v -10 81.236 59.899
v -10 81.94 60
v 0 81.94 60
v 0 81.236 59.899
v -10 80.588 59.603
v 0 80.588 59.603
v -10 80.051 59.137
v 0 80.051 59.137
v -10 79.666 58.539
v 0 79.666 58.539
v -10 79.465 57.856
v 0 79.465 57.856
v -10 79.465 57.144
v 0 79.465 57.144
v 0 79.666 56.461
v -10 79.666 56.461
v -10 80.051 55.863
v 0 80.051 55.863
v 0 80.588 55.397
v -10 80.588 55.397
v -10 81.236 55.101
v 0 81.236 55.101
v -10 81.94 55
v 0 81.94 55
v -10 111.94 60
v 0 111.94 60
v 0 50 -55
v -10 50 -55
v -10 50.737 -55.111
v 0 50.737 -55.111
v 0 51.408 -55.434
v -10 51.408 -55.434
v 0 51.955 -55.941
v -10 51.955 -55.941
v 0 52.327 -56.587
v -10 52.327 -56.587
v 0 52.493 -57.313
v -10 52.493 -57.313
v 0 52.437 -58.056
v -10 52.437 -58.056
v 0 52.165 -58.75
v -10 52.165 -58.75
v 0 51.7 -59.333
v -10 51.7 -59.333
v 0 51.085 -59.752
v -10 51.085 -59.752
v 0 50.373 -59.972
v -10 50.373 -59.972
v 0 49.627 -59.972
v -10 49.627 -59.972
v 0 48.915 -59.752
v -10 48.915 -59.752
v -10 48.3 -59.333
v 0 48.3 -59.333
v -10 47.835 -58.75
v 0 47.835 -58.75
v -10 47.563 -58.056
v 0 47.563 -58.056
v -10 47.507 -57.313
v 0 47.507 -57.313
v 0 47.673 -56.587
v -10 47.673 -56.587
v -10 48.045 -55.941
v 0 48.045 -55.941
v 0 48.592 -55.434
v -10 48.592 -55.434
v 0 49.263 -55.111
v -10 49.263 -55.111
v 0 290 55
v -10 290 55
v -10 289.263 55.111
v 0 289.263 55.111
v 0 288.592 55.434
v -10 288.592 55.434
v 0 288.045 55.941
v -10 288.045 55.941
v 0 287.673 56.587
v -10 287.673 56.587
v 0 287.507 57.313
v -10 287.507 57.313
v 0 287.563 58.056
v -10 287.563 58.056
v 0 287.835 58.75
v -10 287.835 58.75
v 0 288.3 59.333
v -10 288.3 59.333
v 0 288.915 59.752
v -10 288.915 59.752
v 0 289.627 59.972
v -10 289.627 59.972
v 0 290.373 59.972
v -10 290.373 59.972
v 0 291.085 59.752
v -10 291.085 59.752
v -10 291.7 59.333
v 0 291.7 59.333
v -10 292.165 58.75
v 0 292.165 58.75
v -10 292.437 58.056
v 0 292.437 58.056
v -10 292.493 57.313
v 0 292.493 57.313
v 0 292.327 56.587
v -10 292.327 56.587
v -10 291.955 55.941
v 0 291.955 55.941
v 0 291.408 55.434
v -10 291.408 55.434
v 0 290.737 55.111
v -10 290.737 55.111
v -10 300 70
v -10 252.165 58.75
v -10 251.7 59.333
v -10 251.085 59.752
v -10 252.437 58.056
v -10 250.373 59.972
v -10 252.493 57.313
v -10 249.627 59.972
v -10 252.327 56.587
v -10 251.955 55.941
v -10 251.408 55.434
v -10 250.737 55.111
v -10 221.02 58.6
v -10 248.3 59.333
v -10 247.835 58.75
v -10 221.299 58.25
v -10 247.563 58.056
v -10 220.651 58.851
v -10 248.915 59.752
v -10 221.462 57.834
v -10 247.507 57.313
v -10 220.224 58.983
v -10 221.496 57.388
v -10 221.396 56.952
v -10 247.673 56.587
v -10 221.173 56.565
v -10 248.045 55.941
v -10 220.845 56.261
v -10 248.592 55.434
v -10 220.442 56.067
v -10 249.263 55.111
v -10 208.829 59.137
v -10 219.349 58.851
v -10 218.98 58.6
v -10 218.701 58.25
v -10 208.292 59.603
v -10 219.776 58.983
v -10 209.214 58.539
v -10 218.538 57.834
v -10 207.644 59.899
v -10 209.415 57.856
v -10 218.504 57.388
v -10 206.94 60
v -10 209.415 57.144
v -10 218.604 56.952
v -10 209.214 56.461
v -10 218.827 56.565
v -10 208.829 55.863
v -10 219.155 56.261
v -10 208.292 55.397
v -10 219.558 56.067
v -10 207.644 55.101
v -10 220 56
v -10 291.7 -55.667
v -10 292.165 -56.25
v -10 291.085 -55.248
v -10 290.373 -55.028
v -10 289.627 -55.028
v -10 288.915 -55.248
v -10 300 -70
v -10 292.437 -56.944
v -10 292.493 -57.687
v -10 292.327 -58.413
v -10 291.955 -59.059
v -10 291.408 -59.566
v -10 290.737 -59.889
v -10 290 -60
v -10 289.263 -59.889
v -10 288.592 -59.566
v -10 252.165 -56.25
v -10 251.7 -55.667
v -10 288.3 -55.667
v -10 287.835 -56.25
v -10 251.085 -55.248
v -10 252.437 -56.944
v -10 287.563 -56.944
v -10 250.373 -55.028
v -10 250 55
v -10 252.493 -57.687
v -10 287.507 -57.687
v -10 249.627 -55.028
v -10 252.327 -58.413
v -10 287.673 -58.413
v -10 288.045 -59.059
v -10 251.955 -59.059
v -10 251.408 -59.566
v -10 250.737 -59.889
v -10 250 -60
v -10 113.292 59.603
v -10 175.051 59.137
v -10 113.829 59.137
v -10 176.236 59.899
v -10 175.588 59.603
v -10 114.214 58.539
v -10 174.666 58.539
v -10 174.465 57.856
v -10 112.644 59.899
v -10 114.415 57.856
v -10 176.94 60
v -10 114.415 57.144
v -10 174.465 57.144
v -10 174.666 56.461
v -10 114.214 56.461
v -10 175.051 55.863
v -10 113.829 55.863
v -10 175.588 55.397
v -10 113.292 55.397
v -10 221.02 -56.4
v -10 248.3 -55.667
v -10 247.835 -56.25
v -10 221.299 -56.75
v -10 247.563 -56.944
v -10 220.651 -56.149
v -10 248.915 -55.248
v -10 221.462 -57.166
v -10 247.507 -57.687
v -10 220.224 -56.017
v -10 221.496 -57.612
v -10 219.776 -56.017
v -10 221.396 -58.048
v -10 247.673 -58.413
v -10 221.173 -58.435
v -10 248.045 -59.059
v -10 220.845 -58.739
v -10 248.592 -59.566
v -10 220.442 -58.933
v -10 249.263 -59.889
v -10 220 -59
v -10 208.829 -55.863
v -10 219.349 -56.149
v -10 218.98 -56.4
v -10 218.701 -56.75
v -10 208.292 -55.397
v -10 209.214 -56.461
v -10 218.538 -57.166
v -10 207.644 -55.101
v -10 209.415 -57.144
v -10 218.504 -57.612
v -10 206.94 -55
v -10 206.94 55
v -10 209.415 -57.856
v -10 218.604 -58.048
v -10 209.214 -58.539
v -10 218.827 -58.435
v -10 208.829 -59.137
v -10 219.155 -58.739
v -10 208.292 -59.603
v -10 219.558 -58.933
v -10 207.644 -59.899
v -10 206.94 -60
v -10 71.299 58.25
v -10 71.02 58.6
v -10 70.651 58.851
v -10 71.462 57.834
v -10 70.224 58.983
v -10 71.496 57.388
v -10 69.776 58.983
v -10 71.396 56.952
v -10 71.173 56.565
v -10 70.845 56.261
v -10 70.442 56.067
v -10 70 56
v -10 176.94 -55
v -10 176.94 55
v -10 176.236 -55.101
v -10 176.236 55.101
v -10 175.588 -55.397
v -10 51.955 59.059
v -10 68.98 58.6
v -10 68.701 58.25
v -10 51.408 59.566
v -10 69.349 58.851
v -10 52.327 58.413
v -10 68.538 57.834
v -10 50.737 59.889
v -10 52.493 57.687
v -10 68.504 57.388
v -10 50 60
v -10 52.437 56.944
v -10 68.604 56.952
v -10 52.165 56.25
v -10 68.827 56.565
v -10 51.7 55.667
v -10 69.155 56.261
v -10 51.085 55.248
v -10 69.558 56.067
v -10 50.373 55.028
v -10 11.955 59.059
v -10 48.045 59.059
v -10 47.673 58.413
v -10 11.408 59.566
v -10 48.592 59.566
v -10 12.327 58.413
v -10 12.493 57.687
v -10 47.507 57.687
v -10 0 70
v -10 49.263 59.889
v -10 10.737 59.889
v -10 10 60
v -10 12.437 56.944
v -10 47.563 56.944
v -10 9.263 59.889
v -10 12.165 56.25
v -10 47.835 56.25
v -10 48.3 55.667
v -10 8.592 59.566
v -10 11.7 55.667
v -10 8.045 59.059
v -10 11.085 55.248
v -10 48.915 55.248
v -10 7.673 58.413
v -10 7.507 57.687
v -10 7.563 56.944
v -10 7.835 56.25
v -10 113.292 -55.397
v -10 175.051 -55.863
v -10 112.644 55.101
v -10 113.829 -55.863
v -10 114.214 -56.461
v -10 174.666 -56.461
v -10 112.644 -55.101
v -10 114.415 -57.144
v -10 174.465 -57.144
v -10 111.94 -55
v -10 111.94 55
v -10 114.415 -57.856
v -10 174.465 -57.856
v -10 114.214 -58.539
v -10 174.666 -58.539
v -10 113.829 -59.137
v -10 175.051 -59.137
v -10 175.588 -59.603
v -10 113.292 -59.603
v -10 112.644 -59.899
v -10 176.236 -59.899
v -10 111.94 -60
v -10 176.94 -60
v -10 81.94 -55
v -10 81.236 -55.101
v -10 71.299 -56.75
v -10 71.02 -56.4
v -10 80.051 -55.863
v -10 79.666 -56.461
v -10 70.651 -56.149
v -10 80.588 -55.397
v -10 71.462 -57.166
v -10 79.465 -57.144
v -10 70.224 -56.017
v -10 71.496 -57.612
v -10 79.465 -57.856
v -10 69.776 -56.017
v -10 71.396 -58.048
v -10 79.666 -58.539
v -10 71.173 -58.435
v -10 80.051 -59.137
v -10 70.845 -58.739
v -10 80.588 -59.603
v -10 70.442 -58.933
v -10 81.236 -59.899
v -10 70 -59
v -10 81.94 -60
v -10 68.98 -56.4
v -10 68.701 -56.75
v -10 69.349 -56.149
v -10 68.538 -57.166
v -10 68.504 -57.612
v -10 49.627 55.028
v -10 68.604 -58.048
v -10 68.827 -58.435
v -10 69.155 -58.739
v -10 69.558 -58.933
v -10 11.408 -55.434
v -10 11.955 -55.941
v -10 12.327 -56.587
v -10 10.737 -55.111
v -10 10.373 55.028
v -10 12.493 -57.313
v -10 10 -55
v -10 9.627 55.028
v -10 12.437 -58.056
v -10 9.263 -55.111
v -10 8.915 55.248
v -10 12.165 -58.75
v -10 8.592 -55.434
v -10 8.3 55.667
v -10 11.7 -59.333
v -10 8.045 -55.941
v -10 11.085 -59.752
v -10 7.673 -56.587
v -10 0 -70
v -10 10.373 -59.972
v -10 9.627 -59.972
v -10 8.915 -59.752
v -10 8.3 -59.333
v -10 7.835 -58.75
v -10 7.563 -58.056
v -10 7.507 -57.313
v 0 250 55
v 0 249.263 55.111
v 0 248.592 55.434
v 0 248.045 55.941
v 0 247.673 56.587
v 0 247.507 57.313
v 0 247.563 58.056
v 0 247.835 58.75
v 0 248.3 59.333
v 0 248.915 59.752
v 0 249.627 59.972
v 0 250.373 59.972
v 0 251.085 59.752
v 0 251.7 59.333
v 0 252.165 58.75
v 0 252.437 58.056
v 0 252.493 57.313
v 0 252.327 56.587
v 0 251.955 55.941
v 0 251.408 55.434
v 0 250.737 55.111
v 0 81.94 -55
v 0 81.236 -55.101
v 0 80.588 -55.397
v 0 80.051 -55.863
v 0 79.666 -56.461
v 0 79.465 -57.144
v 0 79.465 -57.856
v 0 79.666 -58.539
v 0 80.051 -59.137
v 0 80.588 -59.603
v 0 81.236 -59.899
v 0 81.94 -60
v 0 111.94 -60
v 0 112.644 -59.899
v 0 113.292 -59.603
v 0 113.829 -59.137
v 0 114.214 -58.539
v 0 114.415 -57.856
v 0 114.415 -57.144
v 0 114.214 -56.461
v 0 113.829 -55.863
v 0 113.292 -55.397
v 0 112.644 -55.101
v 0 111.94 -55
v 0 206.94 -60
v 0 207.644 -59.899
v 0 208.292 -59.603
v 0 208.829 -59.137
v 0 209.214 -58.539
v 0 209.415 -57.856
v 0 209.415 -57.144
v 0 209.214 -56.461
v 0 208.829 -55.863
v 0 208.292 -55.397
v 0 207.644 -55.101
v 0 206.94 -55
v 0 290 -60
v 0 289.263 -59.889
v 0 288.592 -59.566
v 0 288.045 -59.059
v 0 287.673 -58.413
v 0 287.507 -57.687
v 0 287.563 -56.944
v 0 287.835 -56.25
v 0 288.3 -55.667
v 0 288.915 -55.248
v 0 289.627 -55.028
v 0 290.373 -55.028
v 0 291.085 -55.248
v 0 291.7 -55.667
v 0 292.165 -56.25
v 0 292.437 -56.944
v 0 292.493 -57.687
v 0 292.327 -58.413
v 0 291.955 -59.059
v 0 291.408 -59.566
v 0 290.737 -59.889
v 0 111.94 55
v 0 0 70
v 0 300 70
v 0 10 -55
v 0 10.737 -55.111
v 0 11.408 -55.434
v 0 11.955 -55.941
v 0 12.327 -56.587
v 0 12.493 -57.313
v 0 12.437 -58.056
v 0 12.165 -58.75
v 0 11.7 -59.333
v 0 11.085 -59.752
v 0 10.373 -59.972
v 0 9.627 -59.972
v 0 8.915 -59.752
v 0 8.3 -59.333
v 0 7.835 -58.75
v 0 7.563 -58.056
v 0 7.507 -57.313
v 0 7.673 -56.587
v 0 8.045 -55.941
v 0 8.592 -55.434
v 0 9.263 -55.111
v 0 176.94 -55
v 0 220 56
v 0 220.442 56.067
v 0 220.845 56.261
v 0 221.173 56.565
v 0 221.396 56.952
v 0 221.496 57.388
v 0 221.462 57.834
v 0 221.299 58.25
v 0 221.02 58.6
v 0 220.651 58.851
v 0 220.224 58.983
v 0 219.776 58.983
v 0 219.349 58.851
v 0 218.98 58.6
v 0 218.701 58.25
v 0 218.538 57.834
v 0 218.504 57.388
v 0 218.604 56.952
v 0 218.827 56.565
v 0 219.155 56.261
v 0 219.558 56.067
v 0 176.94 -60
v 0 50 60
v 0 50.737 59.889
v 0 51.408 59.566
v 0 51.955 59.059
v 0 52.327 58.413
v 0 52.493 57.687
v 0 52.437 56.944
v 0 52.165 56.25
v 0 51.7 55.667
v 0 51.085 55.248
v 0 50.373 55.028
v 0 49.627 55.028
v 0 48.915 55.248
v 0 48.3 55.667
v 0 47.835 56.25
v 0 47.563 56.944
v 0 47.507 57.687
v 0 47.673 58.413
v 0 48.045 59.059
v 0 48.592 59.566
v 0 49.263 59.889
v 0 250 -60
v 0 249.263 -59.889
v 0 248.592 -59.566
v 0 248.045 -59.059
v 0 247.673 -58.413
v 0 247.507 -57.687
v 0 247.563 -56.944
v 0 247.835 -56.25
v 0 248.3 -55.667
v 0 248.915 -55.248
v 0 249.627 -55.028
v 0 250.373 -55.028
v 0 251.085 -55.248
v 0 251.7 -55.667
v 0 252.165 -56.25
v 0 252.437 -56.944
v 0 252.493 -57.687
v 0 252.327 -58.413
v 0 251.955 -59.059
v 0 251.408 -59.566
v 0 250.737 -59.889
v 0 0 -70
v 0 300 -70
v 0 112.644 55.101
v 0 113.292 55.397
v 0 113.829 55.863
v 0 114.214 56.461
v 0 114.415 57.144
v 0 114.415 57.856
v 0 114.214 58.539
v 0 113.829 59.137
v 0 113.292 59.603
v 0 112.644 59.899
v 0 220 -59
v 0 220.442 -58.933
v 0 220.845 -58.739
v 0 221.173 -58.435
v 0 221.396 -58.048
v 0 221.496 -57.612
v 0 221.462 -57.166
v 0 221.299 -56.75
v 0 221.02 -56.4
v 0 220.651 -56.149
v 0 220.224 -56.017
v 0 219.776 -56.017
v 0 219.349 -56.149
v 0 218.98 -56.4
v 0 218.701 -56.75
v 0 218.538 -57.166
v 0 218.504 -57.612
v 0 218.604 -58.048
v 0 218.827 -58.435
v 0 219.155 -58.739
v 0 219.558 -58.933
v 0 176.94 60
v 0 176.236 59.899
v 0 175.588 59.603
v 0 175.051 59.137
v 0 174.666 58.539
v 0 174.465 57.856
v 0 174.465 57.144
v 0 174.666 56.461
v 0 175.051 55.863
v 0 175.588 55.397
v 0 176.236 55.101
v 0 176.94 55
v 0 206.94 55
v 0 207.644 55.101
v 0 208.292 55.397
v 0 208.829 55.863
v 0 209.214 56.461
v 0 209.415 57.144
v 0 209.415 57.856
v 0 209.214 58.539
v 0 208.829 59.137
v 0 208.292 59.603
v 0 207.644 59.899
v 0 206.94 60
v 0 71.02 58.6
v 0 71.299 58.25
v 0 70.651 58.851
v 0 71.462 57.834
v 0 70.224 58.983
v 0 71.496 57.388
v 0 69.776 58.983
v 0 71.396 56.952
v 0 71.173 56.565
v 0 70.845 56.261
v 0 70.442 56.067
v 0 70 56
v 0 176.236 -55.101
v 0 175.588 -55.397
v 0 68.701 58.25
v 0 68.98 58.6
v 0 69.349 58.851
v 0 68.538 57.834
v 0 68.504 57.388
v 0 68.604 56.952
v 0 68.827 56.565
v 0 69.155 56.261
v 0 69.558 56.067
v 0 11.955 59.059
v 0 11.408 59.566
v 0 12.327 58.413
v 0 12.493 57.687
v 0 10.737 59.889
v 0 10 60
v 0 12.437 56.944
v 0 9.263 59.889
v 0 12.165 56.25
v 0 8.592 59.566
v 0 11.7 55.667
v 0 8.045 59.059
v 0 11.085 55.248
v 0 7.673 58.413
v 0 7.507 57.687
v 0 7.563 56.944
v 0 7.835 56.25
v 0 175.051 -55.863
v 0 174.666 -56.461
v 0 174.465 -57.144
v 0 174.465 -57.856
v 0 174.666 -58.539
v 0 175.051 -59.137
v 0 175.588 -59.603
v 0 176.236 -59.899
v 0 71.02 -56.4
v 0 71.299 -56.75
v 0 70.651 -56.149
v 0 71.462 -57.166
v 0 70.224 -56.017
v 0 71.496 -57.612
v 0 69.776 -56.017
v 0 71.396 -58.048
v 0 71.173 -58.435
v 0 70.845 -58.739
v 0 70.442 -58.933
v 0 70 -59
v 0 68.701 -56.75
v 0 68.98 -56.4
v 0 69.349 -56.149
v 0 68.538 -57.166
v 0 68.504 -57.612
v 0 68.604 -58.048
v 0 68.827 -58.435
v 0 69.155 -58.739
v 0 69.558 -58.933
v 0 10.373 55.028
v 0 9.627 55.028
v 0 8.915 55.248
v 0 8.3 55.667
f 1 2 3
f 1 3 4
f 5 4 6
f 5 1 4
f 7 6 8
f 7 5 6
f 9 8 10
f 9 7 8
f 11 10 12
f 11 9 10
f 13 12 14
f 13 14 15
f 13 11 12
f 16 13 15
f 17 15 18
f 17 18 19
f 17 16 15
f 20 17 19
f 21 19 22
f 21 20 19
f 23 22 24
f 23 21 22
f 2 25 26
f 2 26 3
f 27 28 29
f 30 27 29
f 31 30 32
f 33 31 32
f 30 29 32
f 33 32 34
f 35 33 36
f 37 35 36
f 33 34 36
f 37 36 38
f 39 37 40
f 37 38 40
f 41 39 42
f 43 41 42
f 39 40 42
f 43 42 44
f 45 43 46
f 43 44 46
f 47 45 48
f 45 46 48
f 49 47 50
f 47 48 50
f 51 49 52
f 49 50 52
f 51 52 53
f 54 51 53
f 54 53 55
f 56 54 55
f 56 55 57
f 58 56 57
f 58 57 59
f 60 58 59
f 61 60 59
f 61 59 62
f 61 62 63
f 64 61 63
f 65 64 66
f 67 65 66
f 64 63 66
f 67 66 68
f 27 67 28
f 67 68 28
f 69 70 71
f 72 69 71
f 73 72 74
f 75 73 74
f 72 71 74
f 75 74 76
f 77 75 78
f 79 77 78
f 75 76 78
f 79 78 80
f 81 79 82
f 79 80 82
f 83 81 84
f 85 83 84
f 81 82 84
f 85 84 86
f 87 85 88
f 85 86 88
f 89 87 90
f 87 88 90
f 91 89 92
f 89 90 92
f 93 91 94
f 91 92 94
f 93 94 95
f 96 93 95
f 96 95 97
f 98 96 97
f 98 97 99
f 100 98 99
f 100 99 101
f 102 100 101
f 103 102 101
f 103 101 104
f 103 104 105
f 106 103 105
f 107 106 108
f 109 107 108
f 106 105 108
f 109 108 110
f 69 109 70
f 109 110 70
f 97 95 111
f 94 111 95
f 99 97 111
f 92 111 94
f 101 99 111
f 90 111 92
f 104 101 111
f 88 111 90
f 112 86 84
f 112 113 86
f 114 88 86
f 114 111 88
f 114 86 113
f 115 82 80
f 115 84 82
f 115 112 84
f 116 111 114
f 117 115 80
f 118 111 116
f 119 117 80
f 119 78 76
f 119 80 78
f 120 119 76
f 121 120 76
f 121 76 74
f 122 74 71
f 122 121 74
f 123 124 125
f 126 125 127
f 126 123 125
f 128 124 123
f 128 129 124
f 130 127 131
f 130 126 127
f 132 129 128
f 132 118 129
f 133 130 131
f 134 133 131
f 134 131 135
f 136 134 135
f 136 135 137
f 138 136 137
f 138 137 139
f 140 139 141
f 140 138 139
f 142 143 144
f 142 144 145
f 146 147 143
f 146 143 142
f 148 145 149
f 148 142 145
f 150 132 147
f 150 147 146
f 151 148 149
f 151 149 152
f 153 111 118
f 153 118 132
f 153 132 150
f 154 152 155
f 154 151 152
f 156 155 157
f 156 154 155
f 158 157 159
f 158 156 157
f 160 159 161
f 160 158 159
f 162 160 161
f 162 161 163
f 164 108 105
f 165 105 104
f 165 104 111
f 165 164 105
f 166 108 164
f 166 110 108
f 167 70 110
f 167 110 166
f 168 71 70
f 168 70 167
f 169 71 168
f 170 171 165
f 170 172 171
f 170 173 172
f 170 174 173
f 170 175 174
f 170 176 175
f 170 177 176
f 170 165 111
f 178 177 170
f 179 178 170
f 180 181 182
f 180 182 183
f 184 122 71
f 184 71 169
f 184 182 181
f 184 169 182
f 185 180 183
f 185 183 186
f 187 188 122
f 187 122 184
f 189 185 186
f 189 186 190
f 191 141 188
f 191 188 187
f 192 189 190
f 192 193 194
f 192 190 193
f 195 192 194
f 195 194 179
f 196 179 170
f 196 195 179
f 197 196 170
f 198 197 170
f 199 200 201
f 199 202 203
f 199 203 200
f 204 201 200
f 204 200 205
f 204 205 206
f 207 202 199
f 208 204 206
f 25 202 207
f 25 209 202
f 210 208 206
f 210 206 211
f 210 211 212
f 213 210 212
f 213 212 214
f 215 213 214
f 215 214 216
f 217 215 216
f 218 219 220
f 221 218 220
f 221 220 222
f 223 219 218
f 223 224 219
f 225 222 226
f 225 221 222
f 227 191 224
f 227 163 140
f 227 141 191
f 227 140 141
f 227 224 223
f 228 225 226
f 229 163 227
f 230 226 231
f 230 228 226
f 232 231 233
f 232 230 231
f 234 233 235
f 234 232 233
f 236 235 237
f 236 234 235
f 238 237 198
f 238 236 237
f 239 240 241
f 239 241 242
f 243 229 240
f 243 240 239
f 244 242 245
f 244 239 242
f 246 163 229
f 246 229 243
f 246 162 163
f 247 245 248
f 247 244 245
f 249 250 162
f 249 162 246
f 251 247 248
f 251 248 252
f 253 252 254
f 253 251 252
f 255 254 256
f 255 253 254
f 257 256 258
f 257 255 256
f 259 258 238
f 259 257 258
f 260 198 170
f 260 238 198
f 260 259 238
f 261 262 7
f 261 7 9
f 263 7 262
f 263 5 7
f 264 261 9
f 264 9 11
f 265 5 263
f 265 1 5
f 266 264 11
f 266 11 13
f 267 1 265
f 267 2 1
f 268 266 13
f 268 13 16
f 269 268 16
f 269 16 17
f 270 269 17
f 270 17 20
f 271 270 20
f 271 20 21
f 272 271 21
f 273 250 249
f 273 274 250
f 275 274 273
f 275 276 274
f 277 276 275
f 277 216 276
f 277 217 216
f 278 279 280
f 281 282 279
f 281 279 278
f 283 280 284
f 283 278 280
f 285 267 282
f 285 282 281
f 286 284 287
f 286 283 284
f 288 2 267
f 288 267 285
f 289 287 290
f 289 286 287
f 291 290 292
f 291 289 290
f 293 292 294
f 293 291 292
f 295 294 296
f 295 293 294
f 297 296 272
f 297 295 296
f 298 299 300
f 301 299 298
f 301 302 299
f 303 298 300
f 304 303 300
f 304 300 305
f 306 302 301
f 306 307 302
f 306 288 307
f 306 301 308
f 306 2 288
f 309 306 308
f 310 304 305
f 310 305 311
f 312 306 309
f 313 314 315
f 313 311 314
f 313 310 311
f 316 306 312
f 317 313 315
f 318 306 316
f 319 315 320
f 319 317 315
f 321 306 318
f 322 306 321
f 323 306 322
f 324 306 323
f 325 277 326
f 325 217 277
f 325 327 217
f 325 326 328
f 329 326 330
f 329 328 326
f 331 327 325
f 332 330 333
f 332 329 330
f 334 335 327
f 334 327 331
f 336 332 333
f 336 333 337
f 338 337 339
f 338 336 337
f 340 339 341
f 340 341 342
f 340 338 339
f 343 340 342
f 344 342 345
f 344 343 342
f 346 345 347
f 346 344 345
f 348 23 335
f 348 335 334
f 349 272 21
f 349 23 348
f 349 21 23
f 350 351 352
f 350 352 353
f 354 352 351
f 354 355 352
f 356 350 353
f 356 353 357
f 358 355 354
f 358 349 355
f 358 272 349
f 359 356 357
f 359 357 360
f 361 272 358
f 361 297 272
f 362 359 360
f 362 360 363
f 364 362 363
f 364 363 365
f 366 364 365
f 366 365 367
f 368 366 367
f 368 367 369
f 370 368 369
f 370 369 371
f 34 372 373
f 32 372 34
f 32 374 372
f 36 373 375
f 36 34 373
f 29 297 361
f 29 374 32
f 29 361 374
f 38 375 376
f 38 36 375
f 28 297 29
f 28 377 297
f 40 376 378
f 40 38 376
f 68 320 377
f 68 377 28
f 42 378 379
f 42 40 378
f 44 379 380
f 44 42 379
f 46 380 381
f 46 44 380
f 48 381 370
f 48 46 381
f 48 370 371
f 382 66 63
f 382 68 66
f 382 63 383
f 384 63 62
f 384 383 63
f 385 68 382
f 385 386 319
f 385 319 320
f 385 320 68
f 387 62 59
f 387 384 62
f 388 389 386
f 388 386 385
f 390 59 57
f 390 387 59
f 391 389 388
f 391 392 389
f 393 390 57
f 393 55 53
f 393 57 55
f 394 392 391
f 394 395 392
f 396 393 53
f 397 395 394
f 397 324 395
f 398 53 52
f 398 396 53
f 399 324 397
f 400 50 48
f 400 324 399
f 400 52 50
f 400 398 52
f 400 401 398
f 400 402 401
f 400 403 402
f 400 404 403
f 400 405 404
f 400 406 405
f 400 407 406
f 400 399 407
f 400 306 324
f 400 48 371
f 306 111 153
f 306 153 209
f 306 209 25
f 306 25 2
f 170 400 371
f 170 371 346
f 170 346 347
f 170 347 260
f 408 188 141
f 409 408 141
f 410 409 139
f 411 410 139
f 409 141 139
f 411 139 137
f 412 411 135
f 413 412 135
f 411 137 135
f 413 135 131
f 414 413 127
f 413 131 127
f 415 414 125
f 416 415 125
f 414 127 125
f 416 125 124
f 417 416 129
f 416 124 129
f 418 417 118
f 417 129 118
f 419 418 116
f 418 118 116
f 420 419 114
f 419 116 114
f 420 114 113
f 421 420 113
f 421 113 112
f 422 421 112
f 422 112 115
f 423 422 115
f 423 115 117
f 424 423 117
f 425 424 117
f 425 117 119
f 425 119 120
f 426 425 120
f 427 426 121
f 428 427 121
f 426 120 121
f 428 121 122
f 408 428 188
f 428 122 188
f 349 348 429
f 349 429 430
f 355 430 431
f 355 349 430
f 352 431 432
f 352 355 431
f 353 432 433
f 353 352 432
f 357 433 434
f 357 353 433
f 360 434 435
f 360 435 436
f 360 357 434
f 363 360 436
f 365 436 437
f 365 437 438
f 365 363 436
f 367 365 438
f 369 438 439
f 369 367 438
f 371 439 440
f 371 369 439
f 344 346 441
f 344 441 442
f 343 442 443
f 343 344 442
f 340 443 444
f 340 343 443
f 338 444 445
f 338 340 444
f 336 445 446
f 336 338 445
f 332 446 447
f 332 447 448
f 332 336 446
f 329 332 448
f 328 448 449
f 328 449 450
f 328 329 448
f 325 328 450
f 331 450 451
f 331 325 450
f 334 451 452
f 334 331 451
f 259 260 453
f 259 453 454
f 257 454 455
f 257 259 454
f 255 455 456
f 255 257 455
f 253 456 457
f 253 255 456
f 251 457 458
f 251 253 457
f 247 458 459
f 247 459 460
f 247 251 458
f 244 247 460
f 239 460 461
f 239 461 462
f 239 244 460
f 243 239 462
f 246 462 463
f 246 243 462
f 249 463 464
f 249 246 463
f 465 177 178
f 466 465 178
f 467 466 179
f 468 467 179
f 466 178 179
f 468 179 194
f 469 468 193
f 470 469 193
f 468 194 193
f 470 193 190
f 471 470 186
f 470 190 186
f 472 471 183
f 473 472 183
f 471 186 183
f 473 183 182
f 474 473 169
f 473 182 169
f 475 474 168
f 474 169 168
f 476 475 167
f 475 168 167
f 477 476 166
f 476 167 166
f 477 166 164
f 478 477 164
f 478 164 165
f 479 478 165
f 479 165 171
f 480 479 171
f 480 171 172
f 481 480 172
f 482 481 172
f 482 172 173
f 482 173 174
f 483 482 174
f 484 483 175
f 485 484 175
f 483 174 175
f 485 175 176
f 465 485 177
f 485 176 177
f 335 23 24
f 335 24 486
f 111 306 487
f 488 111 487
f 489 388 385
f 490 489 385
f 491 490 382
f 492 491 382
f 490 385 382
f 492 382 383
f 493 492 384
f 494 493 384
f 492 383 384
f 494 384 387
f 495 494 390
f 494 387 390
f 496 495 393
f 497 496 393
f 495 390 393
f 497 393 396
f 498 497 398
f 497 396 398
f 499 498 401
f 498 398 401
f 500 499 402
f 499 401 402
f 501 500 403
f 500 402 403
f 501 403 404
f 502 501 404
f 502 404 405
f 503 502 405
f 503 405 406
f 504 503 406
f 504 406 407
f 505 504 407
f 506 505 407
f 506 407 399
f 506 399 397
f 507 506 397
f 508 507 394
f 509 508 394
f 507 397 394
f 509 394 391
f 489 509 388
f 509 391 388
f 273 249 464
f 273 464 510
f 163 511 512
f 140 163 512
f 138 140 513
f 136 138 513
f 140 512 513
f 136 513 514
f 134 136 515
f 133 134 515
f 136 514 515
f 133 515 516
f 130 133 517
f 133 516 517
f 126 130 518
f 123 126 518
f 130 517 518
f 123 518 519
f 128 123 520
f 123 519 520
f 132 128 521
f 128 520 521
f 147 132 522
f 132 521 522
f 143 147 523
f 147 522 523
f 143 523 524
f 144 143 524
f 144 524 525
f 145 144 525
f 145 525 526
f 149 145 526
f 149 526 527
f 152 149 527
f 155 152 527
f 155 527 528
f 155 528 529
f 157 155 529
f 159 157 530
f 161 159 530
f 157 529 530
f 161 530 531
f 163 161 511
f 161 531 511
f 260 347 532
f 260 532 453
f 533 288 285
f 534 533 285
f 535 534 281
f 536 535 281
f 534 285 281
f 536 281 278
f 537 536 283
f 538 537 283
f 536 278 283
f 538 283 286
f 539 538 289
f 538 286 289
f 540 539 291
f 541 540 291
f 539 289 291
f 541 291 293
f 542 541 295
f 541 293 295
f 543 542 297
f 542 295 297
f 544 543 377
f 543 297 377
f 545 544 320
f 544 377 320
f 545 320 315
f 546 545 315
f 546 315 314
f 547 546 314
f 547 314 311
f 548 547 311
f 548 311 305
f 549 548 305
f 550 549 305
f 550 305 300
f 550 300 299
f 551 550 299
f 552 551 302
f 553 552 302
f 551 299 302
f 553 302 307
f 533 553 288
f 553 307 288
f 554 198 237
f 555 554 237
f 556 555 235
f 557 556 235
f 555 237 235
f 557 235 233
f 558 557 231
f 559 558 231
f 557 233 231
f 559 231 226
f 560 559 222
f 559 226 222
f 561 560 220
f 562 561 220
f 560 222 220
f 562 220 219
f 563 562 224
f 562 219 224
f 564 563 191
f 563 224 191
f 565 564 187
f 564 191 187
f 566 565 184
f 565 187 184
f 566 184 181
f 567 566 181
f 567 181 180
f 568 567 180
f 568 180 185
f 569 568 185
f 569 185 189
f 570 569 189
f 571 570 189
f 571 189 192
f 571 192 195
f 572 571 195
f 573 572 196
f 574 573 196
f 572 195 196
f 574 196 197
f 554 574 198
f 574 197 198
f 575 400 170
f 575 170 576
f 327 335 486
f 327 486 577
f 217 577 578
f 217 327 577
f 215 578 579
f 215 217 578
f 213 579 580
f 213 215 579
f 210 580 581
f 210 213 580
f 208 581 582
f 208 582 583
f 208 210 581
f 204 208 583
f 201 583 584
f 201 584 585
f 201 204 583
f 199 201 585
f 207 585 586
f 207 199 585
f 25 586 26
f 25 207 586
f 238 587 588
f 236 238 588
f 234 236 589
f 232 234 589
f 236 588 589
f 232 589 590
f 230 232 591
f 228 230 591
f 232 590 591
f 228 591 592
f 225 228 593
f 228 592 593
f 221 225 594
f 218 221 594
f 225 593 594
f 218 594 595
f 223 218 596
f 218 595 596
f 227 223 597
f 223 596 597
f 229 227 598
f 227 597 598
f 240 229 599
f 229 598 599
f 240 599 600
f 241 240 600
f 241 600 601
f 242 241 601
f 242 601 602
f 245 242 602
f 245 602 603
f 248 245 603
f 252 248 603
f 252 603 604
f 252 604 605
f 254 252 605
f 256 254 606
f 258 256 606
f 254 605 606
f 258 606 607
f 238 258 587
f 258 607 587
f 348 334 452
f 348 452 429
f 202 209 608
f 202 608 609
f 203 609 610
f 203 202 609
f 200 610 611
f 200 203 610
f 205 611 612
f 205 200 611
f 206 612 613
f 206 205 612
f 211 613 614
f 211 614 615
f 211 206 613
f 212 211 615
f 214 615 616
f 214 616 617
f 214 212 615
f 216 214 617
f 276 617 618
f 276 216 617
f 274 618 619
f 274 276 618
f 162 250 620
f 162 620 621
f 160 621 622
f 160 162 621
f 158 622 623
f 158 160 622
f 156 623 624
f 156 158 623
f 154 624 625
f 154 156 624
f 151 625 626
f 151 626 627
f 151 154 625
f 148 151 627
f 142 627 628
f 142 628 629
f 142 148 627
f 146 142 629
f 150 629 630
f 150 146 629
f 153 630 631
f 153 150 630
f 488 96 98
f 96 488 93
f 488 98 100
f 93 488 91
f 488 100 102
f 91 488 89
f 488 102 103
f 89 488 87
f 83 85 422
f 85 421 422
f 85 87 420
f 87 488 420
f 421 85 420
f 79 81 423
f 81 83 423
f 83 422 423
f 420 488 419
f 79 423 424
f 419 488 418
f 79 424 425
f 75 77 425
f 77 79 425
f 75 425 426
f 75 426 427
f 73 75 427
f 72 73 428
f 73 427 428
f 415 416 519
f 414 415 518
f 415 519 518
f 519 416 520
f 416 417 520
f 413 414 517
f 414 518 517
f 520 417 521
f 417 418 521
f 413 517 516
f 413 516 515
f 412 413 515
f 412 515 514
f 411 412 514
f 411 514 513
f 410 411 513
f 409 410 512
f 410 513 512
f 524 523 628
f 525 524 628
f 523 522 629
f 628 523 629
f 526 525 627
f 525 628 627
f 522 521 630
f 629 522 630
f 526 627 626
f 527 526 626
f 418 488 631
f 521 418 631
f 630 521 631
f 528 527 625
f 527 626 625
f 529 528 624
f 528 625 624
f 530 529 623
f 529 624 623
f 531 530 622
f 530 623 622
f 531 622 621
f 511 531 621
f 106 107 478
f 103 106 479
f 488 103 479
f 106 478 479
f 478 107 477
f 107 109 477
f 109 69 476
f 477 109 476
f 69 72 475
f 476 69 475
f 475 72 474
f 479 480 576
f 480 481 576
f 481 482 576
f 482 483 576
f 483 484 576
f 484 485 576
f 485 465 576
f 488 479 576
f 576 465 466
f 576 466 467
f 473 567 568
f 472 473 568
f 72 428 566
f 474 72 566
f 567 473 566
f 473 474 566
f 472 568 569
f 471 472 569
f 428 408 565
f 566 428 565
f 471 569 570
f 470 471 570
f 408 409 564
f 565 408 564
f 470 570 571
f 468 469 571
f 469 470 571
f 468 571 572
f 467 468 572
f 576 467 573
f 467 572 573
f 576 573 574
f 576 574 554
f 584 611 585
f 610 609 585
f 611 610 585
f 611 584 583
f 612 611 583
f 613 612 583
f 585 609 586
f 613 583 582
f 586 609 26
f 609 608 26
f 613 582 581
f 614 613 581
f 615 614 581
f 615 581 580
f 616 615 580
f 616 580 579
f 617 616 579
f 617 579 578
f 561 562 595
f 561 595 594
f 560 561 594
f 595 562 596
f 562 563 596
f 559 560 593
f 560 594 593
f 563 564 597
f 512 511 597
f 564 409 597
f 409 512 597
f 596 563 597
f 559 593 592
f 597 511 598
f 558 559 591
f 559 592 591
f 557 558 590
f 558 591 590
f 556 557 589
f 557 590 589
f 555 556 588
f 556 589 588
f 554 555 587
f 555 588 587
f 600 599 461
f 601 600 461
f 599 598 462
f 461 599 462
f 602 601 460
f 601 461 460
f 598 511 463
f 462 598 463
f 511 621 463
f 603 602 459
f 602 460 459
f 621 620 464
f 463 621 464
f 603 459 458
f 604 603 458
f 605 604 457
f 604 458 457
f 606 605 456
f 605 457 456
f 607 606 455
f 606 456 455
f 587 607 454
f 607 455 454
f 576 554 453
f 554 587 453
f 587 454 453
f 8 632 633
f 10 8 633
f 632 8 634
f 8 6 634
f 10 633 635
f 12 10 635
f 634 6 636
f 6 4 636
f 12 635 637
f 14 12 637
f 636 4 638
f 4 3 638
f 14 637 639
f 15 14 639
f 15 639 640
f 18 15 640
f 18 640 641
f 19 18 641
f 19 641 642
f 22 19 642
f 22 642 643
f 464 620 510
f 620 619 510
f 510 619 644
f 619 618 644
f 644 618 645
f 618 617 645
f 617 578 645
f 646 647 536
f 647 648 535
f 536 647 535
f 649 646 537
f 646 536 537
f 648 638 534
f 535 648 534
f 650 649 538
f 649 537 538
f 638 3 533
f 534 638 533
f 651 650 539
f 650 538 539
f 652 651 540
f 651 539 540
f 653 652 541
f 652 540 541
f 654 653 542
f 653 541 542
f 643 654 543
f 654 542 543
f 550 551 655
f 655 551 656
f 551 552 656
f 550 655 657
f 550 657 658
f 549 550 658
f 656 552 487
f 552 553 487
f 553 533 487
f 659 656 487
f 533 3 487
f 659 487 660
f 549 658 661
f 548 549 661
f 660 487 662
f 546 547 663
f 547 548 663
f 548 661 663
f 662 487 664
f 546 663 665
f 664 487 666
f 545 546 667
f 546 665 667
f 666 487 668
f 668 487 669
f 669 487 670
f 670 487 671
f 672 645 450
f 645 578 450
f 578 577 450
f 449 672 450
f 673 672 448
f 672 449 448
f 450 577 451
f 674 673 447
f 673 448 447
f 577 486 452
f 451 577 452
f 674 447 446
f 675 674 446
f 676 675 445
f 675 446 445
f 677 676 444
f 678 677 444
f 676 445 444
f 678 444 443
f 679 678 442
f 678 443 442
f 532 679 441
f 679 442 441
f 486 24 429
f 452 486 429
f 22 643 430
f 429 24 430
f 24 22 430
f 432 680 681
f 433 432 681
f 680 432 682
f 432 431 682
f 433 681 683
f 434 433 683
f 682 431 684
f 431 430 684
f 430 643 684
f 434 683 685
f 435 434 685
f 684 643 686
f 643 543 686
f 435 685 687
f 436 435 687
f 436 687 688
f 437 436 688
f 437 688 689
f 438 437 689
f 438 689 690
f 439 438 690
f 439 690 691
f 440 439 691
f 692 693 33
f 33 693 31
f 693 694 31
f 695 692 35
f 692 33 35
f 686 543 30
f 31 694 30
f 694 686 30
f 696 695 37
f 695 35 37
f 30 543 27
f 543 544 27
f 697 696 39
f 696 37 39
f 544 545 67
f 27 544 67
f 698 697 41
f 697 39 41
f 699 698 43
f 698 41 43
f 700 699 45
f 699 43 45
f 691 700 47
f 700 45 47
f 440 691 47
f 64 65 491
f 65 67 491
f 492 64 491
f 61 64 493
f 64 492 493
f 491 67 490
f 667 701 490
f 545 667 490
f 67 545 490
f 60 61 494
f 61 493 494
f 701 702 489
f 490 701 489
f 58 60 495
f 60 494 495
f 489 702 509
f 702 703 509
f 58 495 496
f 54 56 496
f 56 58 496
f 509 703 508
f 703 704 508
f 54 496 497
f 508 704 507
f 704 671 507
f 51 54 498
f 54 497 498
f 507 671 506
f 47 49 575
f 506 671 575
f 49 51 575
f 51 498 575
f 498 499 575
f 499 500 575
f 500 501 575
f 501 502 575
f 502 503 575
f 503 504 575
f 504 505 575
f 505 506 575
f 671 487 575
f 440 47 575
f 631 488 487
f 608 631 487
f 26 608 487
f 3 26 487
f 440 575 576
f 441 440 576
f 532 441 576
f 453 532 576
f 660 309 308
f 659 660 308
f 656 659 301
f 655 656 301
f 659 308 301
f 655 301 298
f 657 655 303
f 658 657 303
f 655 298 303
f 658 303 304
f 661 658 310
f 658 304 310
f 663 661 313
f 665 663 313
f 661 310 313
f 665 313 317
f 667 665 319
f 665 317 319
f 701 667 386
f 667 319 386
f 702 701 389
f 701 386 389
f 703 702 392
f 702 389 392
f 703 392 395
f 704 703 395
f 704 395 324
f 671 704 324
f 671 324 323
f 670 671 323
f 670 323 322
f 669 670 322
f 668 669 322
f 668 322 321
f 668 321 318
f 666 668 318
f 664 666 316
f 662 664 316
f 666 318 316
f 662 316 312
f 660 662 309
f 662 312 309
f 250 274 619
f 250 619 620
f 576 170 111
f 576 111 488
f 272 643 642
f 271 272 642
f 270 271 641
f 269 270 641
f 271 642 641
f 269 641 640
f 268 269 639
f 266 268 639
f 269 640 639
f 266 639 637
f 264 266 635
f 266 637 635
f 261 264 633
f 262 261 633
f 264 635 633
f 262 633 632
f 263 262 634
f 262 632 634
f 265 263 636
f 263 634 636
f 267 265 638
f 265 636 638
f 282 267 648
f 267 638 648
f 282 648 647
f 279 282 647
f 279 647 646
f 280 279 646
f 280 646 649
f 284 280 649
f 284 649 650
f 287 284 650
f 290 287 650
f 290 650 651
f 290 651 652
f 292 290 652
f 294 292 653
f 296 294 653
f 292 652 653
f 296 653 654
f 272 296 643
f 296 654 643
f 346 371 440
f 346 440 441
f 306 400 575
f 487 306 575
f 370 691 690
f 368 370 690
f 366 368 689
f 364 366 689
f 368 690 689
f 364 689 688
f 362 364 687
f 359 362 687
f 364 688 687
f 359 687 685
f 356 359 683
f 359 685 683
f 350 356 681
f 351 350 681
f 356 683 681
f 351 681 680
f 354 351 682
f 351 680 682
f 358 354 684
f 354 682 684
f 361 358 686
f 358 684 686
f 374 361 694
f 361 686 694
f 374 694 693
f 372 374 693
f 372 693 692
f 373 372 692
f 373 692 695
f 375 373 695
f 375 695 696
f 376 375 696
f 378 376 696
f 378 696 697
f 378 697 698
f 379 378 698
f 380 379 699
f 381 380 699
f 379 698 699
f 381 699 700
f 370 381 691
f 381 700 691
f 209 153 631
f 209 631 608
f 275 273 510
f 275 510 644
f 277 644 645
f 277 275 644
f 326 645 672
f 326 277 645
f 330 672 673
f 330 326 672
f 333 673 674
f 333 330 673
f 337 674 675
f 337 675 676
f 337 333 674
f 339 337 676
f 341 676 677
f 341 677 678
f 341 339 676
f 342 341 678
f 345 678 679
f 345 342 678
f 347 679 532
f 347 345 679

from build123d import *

# Parameters (mm, degrees)
BASE_FLANGE1_OUTLINE_W = 10
BASE_FLANGE1_OUTLINE_H = 140
BASE_FLANGE1_DEPTH     = 300
SKETCH6_R              = 2.5
CUT_EXTRUDE1_DEPTH     = 10
SKETCH11_R             = 1.5
CUT_EXTRUDE2_DEPTH     = 10
CUT_EXTRUDE3_DEPTH     = 10


# Read off the part's stored shape, not the designer's step: Base-Flange1
with BuildPart() as part:
    # Base-Flange1 outline → Base-Flange1 (new body)
    with BuildSketch(Plane(origin=(0, 0, 0), x_dir=(1, 0, 0), z_dir=(0, 1, 0))):
        with Locations((-5, 0)):
            Rectangle(BASE_FLANGE1_OUTLINE_W, BASE_FLANGE1_OUTLINE_H)
    extrude(amount=BASE_FLANGE1_DEPTH)

    # Sketch6 → Cut-Extrude1 (cut)
    with BuildSketch(Plane.ZY.offset(10)):
        with Locations((57.5, 10)):
            Circle(SKETCH6_R)
        with Locations((-57.5, 10)):
            Circle(SKETCH6_R)
        with Locations((-57.5, 50)):
            Circle(SKETCH6_R)
        with Locations((57.5, 50)):
            Circle(SKETCH6_R)
        with Locations(Location((57.5, 250, 0), (0, 0, 180))):
            Circle(SKETCH6_R)
        with Locations(Location((-57.5, 250, 0), (0, 0, 180))):
            Circle(SKETCH6_R)
        with Locations(Location((-57.5, 290, 0), (0, 0, 180))):
            Circle(SKETCH6_R)
        with Locations(Location((57.5, 290, 0), (0, 0, 180))):
            Circle(SKETCH6_R)
    extrude(amount=-CUT_EXTRUDE1_DEPTH, mode=Mode.SUBTRACT)

    # Sketch11 → Cut-Extrude2 (cut)
    with BuildSketch(Plane(origin=(0, 0, 0), x_dir=(0, 0, -1), z_dir=(1, 0, 0))):
        with Locations((57.5, 220)):
            Circle(SKETCH11_R)
        with Locations((-57.5, 220)):
            Circle(SKETCH11_R)
        with Locations((-57.5, 70)):
            Circle(SKETCH11_R)
        with Locations((57.5, 70)):
            Circle(SKETCH11_R)
    extrude(amount=-CUT_EXTRUDE2_DEPTH, mode=Mode.SUBTRACT)

    # Sketch12 → Cut-Extrude3 (cut)
    with BuildSketch(Plane.ZY.offset(10)):
        with BuildLine():
            Line((60, 206.940043573), (60, 176.940043573))
            ThreePointArc((60, 176.940043573), (57.5, 174.440043573), (55, 176.940043573))
            Line((55, 176.940043573), (55, 206.940043573))
            ThreePointArc((55, 206.940043573), (57.5, 209.440043573), (60, 206.940043573))
        make_face()
        with BuildLine():
            Line((-55, 206.940043573), (-55, 176.940043573))
            ThreePointArc((-55, 176.940043573), (-57.5, 174.440043573), (-60, 176.940043573))
            Line((-60, 176.940043573), (-60, 206.940043573))
            ThreePointArc((-60, 206.940043573), (-57.5, 209.440043573), (-55, 206.940043573))
        make_face()
        with BuildLine():
            Line((-55, 111.940043573), (-55, 81.940043573))
            ThreePointArc((-55, 81.940043573), (-57.5, 79.440043573), (-60, 81.940043573))
            Line((-60, 81.940043573), (-60, 111.940043573))
            ThreePointArc((-60, 111.940043573), (-57.5, 114.440043573), (-55, 111.940043573))
        make_face()
        with BuildLine():
            Line((60, 111.940043573), (60, 81.940043573))
            ThreePointArc((60, 81.940043573), (57.5, 79.440043573), (55, 81.940043573))
            Line((55, 81.940043573), (55, 111.940043573))
            ThreePointArc((55, 111.940043573), (57.5, 114.440043573), (60, 111.940043573))
        make_face()
    extrude(amount=-CUT_EXTRUDE3_DEPTH, mode=Mode.SUBTRACT)


solid = part.part
